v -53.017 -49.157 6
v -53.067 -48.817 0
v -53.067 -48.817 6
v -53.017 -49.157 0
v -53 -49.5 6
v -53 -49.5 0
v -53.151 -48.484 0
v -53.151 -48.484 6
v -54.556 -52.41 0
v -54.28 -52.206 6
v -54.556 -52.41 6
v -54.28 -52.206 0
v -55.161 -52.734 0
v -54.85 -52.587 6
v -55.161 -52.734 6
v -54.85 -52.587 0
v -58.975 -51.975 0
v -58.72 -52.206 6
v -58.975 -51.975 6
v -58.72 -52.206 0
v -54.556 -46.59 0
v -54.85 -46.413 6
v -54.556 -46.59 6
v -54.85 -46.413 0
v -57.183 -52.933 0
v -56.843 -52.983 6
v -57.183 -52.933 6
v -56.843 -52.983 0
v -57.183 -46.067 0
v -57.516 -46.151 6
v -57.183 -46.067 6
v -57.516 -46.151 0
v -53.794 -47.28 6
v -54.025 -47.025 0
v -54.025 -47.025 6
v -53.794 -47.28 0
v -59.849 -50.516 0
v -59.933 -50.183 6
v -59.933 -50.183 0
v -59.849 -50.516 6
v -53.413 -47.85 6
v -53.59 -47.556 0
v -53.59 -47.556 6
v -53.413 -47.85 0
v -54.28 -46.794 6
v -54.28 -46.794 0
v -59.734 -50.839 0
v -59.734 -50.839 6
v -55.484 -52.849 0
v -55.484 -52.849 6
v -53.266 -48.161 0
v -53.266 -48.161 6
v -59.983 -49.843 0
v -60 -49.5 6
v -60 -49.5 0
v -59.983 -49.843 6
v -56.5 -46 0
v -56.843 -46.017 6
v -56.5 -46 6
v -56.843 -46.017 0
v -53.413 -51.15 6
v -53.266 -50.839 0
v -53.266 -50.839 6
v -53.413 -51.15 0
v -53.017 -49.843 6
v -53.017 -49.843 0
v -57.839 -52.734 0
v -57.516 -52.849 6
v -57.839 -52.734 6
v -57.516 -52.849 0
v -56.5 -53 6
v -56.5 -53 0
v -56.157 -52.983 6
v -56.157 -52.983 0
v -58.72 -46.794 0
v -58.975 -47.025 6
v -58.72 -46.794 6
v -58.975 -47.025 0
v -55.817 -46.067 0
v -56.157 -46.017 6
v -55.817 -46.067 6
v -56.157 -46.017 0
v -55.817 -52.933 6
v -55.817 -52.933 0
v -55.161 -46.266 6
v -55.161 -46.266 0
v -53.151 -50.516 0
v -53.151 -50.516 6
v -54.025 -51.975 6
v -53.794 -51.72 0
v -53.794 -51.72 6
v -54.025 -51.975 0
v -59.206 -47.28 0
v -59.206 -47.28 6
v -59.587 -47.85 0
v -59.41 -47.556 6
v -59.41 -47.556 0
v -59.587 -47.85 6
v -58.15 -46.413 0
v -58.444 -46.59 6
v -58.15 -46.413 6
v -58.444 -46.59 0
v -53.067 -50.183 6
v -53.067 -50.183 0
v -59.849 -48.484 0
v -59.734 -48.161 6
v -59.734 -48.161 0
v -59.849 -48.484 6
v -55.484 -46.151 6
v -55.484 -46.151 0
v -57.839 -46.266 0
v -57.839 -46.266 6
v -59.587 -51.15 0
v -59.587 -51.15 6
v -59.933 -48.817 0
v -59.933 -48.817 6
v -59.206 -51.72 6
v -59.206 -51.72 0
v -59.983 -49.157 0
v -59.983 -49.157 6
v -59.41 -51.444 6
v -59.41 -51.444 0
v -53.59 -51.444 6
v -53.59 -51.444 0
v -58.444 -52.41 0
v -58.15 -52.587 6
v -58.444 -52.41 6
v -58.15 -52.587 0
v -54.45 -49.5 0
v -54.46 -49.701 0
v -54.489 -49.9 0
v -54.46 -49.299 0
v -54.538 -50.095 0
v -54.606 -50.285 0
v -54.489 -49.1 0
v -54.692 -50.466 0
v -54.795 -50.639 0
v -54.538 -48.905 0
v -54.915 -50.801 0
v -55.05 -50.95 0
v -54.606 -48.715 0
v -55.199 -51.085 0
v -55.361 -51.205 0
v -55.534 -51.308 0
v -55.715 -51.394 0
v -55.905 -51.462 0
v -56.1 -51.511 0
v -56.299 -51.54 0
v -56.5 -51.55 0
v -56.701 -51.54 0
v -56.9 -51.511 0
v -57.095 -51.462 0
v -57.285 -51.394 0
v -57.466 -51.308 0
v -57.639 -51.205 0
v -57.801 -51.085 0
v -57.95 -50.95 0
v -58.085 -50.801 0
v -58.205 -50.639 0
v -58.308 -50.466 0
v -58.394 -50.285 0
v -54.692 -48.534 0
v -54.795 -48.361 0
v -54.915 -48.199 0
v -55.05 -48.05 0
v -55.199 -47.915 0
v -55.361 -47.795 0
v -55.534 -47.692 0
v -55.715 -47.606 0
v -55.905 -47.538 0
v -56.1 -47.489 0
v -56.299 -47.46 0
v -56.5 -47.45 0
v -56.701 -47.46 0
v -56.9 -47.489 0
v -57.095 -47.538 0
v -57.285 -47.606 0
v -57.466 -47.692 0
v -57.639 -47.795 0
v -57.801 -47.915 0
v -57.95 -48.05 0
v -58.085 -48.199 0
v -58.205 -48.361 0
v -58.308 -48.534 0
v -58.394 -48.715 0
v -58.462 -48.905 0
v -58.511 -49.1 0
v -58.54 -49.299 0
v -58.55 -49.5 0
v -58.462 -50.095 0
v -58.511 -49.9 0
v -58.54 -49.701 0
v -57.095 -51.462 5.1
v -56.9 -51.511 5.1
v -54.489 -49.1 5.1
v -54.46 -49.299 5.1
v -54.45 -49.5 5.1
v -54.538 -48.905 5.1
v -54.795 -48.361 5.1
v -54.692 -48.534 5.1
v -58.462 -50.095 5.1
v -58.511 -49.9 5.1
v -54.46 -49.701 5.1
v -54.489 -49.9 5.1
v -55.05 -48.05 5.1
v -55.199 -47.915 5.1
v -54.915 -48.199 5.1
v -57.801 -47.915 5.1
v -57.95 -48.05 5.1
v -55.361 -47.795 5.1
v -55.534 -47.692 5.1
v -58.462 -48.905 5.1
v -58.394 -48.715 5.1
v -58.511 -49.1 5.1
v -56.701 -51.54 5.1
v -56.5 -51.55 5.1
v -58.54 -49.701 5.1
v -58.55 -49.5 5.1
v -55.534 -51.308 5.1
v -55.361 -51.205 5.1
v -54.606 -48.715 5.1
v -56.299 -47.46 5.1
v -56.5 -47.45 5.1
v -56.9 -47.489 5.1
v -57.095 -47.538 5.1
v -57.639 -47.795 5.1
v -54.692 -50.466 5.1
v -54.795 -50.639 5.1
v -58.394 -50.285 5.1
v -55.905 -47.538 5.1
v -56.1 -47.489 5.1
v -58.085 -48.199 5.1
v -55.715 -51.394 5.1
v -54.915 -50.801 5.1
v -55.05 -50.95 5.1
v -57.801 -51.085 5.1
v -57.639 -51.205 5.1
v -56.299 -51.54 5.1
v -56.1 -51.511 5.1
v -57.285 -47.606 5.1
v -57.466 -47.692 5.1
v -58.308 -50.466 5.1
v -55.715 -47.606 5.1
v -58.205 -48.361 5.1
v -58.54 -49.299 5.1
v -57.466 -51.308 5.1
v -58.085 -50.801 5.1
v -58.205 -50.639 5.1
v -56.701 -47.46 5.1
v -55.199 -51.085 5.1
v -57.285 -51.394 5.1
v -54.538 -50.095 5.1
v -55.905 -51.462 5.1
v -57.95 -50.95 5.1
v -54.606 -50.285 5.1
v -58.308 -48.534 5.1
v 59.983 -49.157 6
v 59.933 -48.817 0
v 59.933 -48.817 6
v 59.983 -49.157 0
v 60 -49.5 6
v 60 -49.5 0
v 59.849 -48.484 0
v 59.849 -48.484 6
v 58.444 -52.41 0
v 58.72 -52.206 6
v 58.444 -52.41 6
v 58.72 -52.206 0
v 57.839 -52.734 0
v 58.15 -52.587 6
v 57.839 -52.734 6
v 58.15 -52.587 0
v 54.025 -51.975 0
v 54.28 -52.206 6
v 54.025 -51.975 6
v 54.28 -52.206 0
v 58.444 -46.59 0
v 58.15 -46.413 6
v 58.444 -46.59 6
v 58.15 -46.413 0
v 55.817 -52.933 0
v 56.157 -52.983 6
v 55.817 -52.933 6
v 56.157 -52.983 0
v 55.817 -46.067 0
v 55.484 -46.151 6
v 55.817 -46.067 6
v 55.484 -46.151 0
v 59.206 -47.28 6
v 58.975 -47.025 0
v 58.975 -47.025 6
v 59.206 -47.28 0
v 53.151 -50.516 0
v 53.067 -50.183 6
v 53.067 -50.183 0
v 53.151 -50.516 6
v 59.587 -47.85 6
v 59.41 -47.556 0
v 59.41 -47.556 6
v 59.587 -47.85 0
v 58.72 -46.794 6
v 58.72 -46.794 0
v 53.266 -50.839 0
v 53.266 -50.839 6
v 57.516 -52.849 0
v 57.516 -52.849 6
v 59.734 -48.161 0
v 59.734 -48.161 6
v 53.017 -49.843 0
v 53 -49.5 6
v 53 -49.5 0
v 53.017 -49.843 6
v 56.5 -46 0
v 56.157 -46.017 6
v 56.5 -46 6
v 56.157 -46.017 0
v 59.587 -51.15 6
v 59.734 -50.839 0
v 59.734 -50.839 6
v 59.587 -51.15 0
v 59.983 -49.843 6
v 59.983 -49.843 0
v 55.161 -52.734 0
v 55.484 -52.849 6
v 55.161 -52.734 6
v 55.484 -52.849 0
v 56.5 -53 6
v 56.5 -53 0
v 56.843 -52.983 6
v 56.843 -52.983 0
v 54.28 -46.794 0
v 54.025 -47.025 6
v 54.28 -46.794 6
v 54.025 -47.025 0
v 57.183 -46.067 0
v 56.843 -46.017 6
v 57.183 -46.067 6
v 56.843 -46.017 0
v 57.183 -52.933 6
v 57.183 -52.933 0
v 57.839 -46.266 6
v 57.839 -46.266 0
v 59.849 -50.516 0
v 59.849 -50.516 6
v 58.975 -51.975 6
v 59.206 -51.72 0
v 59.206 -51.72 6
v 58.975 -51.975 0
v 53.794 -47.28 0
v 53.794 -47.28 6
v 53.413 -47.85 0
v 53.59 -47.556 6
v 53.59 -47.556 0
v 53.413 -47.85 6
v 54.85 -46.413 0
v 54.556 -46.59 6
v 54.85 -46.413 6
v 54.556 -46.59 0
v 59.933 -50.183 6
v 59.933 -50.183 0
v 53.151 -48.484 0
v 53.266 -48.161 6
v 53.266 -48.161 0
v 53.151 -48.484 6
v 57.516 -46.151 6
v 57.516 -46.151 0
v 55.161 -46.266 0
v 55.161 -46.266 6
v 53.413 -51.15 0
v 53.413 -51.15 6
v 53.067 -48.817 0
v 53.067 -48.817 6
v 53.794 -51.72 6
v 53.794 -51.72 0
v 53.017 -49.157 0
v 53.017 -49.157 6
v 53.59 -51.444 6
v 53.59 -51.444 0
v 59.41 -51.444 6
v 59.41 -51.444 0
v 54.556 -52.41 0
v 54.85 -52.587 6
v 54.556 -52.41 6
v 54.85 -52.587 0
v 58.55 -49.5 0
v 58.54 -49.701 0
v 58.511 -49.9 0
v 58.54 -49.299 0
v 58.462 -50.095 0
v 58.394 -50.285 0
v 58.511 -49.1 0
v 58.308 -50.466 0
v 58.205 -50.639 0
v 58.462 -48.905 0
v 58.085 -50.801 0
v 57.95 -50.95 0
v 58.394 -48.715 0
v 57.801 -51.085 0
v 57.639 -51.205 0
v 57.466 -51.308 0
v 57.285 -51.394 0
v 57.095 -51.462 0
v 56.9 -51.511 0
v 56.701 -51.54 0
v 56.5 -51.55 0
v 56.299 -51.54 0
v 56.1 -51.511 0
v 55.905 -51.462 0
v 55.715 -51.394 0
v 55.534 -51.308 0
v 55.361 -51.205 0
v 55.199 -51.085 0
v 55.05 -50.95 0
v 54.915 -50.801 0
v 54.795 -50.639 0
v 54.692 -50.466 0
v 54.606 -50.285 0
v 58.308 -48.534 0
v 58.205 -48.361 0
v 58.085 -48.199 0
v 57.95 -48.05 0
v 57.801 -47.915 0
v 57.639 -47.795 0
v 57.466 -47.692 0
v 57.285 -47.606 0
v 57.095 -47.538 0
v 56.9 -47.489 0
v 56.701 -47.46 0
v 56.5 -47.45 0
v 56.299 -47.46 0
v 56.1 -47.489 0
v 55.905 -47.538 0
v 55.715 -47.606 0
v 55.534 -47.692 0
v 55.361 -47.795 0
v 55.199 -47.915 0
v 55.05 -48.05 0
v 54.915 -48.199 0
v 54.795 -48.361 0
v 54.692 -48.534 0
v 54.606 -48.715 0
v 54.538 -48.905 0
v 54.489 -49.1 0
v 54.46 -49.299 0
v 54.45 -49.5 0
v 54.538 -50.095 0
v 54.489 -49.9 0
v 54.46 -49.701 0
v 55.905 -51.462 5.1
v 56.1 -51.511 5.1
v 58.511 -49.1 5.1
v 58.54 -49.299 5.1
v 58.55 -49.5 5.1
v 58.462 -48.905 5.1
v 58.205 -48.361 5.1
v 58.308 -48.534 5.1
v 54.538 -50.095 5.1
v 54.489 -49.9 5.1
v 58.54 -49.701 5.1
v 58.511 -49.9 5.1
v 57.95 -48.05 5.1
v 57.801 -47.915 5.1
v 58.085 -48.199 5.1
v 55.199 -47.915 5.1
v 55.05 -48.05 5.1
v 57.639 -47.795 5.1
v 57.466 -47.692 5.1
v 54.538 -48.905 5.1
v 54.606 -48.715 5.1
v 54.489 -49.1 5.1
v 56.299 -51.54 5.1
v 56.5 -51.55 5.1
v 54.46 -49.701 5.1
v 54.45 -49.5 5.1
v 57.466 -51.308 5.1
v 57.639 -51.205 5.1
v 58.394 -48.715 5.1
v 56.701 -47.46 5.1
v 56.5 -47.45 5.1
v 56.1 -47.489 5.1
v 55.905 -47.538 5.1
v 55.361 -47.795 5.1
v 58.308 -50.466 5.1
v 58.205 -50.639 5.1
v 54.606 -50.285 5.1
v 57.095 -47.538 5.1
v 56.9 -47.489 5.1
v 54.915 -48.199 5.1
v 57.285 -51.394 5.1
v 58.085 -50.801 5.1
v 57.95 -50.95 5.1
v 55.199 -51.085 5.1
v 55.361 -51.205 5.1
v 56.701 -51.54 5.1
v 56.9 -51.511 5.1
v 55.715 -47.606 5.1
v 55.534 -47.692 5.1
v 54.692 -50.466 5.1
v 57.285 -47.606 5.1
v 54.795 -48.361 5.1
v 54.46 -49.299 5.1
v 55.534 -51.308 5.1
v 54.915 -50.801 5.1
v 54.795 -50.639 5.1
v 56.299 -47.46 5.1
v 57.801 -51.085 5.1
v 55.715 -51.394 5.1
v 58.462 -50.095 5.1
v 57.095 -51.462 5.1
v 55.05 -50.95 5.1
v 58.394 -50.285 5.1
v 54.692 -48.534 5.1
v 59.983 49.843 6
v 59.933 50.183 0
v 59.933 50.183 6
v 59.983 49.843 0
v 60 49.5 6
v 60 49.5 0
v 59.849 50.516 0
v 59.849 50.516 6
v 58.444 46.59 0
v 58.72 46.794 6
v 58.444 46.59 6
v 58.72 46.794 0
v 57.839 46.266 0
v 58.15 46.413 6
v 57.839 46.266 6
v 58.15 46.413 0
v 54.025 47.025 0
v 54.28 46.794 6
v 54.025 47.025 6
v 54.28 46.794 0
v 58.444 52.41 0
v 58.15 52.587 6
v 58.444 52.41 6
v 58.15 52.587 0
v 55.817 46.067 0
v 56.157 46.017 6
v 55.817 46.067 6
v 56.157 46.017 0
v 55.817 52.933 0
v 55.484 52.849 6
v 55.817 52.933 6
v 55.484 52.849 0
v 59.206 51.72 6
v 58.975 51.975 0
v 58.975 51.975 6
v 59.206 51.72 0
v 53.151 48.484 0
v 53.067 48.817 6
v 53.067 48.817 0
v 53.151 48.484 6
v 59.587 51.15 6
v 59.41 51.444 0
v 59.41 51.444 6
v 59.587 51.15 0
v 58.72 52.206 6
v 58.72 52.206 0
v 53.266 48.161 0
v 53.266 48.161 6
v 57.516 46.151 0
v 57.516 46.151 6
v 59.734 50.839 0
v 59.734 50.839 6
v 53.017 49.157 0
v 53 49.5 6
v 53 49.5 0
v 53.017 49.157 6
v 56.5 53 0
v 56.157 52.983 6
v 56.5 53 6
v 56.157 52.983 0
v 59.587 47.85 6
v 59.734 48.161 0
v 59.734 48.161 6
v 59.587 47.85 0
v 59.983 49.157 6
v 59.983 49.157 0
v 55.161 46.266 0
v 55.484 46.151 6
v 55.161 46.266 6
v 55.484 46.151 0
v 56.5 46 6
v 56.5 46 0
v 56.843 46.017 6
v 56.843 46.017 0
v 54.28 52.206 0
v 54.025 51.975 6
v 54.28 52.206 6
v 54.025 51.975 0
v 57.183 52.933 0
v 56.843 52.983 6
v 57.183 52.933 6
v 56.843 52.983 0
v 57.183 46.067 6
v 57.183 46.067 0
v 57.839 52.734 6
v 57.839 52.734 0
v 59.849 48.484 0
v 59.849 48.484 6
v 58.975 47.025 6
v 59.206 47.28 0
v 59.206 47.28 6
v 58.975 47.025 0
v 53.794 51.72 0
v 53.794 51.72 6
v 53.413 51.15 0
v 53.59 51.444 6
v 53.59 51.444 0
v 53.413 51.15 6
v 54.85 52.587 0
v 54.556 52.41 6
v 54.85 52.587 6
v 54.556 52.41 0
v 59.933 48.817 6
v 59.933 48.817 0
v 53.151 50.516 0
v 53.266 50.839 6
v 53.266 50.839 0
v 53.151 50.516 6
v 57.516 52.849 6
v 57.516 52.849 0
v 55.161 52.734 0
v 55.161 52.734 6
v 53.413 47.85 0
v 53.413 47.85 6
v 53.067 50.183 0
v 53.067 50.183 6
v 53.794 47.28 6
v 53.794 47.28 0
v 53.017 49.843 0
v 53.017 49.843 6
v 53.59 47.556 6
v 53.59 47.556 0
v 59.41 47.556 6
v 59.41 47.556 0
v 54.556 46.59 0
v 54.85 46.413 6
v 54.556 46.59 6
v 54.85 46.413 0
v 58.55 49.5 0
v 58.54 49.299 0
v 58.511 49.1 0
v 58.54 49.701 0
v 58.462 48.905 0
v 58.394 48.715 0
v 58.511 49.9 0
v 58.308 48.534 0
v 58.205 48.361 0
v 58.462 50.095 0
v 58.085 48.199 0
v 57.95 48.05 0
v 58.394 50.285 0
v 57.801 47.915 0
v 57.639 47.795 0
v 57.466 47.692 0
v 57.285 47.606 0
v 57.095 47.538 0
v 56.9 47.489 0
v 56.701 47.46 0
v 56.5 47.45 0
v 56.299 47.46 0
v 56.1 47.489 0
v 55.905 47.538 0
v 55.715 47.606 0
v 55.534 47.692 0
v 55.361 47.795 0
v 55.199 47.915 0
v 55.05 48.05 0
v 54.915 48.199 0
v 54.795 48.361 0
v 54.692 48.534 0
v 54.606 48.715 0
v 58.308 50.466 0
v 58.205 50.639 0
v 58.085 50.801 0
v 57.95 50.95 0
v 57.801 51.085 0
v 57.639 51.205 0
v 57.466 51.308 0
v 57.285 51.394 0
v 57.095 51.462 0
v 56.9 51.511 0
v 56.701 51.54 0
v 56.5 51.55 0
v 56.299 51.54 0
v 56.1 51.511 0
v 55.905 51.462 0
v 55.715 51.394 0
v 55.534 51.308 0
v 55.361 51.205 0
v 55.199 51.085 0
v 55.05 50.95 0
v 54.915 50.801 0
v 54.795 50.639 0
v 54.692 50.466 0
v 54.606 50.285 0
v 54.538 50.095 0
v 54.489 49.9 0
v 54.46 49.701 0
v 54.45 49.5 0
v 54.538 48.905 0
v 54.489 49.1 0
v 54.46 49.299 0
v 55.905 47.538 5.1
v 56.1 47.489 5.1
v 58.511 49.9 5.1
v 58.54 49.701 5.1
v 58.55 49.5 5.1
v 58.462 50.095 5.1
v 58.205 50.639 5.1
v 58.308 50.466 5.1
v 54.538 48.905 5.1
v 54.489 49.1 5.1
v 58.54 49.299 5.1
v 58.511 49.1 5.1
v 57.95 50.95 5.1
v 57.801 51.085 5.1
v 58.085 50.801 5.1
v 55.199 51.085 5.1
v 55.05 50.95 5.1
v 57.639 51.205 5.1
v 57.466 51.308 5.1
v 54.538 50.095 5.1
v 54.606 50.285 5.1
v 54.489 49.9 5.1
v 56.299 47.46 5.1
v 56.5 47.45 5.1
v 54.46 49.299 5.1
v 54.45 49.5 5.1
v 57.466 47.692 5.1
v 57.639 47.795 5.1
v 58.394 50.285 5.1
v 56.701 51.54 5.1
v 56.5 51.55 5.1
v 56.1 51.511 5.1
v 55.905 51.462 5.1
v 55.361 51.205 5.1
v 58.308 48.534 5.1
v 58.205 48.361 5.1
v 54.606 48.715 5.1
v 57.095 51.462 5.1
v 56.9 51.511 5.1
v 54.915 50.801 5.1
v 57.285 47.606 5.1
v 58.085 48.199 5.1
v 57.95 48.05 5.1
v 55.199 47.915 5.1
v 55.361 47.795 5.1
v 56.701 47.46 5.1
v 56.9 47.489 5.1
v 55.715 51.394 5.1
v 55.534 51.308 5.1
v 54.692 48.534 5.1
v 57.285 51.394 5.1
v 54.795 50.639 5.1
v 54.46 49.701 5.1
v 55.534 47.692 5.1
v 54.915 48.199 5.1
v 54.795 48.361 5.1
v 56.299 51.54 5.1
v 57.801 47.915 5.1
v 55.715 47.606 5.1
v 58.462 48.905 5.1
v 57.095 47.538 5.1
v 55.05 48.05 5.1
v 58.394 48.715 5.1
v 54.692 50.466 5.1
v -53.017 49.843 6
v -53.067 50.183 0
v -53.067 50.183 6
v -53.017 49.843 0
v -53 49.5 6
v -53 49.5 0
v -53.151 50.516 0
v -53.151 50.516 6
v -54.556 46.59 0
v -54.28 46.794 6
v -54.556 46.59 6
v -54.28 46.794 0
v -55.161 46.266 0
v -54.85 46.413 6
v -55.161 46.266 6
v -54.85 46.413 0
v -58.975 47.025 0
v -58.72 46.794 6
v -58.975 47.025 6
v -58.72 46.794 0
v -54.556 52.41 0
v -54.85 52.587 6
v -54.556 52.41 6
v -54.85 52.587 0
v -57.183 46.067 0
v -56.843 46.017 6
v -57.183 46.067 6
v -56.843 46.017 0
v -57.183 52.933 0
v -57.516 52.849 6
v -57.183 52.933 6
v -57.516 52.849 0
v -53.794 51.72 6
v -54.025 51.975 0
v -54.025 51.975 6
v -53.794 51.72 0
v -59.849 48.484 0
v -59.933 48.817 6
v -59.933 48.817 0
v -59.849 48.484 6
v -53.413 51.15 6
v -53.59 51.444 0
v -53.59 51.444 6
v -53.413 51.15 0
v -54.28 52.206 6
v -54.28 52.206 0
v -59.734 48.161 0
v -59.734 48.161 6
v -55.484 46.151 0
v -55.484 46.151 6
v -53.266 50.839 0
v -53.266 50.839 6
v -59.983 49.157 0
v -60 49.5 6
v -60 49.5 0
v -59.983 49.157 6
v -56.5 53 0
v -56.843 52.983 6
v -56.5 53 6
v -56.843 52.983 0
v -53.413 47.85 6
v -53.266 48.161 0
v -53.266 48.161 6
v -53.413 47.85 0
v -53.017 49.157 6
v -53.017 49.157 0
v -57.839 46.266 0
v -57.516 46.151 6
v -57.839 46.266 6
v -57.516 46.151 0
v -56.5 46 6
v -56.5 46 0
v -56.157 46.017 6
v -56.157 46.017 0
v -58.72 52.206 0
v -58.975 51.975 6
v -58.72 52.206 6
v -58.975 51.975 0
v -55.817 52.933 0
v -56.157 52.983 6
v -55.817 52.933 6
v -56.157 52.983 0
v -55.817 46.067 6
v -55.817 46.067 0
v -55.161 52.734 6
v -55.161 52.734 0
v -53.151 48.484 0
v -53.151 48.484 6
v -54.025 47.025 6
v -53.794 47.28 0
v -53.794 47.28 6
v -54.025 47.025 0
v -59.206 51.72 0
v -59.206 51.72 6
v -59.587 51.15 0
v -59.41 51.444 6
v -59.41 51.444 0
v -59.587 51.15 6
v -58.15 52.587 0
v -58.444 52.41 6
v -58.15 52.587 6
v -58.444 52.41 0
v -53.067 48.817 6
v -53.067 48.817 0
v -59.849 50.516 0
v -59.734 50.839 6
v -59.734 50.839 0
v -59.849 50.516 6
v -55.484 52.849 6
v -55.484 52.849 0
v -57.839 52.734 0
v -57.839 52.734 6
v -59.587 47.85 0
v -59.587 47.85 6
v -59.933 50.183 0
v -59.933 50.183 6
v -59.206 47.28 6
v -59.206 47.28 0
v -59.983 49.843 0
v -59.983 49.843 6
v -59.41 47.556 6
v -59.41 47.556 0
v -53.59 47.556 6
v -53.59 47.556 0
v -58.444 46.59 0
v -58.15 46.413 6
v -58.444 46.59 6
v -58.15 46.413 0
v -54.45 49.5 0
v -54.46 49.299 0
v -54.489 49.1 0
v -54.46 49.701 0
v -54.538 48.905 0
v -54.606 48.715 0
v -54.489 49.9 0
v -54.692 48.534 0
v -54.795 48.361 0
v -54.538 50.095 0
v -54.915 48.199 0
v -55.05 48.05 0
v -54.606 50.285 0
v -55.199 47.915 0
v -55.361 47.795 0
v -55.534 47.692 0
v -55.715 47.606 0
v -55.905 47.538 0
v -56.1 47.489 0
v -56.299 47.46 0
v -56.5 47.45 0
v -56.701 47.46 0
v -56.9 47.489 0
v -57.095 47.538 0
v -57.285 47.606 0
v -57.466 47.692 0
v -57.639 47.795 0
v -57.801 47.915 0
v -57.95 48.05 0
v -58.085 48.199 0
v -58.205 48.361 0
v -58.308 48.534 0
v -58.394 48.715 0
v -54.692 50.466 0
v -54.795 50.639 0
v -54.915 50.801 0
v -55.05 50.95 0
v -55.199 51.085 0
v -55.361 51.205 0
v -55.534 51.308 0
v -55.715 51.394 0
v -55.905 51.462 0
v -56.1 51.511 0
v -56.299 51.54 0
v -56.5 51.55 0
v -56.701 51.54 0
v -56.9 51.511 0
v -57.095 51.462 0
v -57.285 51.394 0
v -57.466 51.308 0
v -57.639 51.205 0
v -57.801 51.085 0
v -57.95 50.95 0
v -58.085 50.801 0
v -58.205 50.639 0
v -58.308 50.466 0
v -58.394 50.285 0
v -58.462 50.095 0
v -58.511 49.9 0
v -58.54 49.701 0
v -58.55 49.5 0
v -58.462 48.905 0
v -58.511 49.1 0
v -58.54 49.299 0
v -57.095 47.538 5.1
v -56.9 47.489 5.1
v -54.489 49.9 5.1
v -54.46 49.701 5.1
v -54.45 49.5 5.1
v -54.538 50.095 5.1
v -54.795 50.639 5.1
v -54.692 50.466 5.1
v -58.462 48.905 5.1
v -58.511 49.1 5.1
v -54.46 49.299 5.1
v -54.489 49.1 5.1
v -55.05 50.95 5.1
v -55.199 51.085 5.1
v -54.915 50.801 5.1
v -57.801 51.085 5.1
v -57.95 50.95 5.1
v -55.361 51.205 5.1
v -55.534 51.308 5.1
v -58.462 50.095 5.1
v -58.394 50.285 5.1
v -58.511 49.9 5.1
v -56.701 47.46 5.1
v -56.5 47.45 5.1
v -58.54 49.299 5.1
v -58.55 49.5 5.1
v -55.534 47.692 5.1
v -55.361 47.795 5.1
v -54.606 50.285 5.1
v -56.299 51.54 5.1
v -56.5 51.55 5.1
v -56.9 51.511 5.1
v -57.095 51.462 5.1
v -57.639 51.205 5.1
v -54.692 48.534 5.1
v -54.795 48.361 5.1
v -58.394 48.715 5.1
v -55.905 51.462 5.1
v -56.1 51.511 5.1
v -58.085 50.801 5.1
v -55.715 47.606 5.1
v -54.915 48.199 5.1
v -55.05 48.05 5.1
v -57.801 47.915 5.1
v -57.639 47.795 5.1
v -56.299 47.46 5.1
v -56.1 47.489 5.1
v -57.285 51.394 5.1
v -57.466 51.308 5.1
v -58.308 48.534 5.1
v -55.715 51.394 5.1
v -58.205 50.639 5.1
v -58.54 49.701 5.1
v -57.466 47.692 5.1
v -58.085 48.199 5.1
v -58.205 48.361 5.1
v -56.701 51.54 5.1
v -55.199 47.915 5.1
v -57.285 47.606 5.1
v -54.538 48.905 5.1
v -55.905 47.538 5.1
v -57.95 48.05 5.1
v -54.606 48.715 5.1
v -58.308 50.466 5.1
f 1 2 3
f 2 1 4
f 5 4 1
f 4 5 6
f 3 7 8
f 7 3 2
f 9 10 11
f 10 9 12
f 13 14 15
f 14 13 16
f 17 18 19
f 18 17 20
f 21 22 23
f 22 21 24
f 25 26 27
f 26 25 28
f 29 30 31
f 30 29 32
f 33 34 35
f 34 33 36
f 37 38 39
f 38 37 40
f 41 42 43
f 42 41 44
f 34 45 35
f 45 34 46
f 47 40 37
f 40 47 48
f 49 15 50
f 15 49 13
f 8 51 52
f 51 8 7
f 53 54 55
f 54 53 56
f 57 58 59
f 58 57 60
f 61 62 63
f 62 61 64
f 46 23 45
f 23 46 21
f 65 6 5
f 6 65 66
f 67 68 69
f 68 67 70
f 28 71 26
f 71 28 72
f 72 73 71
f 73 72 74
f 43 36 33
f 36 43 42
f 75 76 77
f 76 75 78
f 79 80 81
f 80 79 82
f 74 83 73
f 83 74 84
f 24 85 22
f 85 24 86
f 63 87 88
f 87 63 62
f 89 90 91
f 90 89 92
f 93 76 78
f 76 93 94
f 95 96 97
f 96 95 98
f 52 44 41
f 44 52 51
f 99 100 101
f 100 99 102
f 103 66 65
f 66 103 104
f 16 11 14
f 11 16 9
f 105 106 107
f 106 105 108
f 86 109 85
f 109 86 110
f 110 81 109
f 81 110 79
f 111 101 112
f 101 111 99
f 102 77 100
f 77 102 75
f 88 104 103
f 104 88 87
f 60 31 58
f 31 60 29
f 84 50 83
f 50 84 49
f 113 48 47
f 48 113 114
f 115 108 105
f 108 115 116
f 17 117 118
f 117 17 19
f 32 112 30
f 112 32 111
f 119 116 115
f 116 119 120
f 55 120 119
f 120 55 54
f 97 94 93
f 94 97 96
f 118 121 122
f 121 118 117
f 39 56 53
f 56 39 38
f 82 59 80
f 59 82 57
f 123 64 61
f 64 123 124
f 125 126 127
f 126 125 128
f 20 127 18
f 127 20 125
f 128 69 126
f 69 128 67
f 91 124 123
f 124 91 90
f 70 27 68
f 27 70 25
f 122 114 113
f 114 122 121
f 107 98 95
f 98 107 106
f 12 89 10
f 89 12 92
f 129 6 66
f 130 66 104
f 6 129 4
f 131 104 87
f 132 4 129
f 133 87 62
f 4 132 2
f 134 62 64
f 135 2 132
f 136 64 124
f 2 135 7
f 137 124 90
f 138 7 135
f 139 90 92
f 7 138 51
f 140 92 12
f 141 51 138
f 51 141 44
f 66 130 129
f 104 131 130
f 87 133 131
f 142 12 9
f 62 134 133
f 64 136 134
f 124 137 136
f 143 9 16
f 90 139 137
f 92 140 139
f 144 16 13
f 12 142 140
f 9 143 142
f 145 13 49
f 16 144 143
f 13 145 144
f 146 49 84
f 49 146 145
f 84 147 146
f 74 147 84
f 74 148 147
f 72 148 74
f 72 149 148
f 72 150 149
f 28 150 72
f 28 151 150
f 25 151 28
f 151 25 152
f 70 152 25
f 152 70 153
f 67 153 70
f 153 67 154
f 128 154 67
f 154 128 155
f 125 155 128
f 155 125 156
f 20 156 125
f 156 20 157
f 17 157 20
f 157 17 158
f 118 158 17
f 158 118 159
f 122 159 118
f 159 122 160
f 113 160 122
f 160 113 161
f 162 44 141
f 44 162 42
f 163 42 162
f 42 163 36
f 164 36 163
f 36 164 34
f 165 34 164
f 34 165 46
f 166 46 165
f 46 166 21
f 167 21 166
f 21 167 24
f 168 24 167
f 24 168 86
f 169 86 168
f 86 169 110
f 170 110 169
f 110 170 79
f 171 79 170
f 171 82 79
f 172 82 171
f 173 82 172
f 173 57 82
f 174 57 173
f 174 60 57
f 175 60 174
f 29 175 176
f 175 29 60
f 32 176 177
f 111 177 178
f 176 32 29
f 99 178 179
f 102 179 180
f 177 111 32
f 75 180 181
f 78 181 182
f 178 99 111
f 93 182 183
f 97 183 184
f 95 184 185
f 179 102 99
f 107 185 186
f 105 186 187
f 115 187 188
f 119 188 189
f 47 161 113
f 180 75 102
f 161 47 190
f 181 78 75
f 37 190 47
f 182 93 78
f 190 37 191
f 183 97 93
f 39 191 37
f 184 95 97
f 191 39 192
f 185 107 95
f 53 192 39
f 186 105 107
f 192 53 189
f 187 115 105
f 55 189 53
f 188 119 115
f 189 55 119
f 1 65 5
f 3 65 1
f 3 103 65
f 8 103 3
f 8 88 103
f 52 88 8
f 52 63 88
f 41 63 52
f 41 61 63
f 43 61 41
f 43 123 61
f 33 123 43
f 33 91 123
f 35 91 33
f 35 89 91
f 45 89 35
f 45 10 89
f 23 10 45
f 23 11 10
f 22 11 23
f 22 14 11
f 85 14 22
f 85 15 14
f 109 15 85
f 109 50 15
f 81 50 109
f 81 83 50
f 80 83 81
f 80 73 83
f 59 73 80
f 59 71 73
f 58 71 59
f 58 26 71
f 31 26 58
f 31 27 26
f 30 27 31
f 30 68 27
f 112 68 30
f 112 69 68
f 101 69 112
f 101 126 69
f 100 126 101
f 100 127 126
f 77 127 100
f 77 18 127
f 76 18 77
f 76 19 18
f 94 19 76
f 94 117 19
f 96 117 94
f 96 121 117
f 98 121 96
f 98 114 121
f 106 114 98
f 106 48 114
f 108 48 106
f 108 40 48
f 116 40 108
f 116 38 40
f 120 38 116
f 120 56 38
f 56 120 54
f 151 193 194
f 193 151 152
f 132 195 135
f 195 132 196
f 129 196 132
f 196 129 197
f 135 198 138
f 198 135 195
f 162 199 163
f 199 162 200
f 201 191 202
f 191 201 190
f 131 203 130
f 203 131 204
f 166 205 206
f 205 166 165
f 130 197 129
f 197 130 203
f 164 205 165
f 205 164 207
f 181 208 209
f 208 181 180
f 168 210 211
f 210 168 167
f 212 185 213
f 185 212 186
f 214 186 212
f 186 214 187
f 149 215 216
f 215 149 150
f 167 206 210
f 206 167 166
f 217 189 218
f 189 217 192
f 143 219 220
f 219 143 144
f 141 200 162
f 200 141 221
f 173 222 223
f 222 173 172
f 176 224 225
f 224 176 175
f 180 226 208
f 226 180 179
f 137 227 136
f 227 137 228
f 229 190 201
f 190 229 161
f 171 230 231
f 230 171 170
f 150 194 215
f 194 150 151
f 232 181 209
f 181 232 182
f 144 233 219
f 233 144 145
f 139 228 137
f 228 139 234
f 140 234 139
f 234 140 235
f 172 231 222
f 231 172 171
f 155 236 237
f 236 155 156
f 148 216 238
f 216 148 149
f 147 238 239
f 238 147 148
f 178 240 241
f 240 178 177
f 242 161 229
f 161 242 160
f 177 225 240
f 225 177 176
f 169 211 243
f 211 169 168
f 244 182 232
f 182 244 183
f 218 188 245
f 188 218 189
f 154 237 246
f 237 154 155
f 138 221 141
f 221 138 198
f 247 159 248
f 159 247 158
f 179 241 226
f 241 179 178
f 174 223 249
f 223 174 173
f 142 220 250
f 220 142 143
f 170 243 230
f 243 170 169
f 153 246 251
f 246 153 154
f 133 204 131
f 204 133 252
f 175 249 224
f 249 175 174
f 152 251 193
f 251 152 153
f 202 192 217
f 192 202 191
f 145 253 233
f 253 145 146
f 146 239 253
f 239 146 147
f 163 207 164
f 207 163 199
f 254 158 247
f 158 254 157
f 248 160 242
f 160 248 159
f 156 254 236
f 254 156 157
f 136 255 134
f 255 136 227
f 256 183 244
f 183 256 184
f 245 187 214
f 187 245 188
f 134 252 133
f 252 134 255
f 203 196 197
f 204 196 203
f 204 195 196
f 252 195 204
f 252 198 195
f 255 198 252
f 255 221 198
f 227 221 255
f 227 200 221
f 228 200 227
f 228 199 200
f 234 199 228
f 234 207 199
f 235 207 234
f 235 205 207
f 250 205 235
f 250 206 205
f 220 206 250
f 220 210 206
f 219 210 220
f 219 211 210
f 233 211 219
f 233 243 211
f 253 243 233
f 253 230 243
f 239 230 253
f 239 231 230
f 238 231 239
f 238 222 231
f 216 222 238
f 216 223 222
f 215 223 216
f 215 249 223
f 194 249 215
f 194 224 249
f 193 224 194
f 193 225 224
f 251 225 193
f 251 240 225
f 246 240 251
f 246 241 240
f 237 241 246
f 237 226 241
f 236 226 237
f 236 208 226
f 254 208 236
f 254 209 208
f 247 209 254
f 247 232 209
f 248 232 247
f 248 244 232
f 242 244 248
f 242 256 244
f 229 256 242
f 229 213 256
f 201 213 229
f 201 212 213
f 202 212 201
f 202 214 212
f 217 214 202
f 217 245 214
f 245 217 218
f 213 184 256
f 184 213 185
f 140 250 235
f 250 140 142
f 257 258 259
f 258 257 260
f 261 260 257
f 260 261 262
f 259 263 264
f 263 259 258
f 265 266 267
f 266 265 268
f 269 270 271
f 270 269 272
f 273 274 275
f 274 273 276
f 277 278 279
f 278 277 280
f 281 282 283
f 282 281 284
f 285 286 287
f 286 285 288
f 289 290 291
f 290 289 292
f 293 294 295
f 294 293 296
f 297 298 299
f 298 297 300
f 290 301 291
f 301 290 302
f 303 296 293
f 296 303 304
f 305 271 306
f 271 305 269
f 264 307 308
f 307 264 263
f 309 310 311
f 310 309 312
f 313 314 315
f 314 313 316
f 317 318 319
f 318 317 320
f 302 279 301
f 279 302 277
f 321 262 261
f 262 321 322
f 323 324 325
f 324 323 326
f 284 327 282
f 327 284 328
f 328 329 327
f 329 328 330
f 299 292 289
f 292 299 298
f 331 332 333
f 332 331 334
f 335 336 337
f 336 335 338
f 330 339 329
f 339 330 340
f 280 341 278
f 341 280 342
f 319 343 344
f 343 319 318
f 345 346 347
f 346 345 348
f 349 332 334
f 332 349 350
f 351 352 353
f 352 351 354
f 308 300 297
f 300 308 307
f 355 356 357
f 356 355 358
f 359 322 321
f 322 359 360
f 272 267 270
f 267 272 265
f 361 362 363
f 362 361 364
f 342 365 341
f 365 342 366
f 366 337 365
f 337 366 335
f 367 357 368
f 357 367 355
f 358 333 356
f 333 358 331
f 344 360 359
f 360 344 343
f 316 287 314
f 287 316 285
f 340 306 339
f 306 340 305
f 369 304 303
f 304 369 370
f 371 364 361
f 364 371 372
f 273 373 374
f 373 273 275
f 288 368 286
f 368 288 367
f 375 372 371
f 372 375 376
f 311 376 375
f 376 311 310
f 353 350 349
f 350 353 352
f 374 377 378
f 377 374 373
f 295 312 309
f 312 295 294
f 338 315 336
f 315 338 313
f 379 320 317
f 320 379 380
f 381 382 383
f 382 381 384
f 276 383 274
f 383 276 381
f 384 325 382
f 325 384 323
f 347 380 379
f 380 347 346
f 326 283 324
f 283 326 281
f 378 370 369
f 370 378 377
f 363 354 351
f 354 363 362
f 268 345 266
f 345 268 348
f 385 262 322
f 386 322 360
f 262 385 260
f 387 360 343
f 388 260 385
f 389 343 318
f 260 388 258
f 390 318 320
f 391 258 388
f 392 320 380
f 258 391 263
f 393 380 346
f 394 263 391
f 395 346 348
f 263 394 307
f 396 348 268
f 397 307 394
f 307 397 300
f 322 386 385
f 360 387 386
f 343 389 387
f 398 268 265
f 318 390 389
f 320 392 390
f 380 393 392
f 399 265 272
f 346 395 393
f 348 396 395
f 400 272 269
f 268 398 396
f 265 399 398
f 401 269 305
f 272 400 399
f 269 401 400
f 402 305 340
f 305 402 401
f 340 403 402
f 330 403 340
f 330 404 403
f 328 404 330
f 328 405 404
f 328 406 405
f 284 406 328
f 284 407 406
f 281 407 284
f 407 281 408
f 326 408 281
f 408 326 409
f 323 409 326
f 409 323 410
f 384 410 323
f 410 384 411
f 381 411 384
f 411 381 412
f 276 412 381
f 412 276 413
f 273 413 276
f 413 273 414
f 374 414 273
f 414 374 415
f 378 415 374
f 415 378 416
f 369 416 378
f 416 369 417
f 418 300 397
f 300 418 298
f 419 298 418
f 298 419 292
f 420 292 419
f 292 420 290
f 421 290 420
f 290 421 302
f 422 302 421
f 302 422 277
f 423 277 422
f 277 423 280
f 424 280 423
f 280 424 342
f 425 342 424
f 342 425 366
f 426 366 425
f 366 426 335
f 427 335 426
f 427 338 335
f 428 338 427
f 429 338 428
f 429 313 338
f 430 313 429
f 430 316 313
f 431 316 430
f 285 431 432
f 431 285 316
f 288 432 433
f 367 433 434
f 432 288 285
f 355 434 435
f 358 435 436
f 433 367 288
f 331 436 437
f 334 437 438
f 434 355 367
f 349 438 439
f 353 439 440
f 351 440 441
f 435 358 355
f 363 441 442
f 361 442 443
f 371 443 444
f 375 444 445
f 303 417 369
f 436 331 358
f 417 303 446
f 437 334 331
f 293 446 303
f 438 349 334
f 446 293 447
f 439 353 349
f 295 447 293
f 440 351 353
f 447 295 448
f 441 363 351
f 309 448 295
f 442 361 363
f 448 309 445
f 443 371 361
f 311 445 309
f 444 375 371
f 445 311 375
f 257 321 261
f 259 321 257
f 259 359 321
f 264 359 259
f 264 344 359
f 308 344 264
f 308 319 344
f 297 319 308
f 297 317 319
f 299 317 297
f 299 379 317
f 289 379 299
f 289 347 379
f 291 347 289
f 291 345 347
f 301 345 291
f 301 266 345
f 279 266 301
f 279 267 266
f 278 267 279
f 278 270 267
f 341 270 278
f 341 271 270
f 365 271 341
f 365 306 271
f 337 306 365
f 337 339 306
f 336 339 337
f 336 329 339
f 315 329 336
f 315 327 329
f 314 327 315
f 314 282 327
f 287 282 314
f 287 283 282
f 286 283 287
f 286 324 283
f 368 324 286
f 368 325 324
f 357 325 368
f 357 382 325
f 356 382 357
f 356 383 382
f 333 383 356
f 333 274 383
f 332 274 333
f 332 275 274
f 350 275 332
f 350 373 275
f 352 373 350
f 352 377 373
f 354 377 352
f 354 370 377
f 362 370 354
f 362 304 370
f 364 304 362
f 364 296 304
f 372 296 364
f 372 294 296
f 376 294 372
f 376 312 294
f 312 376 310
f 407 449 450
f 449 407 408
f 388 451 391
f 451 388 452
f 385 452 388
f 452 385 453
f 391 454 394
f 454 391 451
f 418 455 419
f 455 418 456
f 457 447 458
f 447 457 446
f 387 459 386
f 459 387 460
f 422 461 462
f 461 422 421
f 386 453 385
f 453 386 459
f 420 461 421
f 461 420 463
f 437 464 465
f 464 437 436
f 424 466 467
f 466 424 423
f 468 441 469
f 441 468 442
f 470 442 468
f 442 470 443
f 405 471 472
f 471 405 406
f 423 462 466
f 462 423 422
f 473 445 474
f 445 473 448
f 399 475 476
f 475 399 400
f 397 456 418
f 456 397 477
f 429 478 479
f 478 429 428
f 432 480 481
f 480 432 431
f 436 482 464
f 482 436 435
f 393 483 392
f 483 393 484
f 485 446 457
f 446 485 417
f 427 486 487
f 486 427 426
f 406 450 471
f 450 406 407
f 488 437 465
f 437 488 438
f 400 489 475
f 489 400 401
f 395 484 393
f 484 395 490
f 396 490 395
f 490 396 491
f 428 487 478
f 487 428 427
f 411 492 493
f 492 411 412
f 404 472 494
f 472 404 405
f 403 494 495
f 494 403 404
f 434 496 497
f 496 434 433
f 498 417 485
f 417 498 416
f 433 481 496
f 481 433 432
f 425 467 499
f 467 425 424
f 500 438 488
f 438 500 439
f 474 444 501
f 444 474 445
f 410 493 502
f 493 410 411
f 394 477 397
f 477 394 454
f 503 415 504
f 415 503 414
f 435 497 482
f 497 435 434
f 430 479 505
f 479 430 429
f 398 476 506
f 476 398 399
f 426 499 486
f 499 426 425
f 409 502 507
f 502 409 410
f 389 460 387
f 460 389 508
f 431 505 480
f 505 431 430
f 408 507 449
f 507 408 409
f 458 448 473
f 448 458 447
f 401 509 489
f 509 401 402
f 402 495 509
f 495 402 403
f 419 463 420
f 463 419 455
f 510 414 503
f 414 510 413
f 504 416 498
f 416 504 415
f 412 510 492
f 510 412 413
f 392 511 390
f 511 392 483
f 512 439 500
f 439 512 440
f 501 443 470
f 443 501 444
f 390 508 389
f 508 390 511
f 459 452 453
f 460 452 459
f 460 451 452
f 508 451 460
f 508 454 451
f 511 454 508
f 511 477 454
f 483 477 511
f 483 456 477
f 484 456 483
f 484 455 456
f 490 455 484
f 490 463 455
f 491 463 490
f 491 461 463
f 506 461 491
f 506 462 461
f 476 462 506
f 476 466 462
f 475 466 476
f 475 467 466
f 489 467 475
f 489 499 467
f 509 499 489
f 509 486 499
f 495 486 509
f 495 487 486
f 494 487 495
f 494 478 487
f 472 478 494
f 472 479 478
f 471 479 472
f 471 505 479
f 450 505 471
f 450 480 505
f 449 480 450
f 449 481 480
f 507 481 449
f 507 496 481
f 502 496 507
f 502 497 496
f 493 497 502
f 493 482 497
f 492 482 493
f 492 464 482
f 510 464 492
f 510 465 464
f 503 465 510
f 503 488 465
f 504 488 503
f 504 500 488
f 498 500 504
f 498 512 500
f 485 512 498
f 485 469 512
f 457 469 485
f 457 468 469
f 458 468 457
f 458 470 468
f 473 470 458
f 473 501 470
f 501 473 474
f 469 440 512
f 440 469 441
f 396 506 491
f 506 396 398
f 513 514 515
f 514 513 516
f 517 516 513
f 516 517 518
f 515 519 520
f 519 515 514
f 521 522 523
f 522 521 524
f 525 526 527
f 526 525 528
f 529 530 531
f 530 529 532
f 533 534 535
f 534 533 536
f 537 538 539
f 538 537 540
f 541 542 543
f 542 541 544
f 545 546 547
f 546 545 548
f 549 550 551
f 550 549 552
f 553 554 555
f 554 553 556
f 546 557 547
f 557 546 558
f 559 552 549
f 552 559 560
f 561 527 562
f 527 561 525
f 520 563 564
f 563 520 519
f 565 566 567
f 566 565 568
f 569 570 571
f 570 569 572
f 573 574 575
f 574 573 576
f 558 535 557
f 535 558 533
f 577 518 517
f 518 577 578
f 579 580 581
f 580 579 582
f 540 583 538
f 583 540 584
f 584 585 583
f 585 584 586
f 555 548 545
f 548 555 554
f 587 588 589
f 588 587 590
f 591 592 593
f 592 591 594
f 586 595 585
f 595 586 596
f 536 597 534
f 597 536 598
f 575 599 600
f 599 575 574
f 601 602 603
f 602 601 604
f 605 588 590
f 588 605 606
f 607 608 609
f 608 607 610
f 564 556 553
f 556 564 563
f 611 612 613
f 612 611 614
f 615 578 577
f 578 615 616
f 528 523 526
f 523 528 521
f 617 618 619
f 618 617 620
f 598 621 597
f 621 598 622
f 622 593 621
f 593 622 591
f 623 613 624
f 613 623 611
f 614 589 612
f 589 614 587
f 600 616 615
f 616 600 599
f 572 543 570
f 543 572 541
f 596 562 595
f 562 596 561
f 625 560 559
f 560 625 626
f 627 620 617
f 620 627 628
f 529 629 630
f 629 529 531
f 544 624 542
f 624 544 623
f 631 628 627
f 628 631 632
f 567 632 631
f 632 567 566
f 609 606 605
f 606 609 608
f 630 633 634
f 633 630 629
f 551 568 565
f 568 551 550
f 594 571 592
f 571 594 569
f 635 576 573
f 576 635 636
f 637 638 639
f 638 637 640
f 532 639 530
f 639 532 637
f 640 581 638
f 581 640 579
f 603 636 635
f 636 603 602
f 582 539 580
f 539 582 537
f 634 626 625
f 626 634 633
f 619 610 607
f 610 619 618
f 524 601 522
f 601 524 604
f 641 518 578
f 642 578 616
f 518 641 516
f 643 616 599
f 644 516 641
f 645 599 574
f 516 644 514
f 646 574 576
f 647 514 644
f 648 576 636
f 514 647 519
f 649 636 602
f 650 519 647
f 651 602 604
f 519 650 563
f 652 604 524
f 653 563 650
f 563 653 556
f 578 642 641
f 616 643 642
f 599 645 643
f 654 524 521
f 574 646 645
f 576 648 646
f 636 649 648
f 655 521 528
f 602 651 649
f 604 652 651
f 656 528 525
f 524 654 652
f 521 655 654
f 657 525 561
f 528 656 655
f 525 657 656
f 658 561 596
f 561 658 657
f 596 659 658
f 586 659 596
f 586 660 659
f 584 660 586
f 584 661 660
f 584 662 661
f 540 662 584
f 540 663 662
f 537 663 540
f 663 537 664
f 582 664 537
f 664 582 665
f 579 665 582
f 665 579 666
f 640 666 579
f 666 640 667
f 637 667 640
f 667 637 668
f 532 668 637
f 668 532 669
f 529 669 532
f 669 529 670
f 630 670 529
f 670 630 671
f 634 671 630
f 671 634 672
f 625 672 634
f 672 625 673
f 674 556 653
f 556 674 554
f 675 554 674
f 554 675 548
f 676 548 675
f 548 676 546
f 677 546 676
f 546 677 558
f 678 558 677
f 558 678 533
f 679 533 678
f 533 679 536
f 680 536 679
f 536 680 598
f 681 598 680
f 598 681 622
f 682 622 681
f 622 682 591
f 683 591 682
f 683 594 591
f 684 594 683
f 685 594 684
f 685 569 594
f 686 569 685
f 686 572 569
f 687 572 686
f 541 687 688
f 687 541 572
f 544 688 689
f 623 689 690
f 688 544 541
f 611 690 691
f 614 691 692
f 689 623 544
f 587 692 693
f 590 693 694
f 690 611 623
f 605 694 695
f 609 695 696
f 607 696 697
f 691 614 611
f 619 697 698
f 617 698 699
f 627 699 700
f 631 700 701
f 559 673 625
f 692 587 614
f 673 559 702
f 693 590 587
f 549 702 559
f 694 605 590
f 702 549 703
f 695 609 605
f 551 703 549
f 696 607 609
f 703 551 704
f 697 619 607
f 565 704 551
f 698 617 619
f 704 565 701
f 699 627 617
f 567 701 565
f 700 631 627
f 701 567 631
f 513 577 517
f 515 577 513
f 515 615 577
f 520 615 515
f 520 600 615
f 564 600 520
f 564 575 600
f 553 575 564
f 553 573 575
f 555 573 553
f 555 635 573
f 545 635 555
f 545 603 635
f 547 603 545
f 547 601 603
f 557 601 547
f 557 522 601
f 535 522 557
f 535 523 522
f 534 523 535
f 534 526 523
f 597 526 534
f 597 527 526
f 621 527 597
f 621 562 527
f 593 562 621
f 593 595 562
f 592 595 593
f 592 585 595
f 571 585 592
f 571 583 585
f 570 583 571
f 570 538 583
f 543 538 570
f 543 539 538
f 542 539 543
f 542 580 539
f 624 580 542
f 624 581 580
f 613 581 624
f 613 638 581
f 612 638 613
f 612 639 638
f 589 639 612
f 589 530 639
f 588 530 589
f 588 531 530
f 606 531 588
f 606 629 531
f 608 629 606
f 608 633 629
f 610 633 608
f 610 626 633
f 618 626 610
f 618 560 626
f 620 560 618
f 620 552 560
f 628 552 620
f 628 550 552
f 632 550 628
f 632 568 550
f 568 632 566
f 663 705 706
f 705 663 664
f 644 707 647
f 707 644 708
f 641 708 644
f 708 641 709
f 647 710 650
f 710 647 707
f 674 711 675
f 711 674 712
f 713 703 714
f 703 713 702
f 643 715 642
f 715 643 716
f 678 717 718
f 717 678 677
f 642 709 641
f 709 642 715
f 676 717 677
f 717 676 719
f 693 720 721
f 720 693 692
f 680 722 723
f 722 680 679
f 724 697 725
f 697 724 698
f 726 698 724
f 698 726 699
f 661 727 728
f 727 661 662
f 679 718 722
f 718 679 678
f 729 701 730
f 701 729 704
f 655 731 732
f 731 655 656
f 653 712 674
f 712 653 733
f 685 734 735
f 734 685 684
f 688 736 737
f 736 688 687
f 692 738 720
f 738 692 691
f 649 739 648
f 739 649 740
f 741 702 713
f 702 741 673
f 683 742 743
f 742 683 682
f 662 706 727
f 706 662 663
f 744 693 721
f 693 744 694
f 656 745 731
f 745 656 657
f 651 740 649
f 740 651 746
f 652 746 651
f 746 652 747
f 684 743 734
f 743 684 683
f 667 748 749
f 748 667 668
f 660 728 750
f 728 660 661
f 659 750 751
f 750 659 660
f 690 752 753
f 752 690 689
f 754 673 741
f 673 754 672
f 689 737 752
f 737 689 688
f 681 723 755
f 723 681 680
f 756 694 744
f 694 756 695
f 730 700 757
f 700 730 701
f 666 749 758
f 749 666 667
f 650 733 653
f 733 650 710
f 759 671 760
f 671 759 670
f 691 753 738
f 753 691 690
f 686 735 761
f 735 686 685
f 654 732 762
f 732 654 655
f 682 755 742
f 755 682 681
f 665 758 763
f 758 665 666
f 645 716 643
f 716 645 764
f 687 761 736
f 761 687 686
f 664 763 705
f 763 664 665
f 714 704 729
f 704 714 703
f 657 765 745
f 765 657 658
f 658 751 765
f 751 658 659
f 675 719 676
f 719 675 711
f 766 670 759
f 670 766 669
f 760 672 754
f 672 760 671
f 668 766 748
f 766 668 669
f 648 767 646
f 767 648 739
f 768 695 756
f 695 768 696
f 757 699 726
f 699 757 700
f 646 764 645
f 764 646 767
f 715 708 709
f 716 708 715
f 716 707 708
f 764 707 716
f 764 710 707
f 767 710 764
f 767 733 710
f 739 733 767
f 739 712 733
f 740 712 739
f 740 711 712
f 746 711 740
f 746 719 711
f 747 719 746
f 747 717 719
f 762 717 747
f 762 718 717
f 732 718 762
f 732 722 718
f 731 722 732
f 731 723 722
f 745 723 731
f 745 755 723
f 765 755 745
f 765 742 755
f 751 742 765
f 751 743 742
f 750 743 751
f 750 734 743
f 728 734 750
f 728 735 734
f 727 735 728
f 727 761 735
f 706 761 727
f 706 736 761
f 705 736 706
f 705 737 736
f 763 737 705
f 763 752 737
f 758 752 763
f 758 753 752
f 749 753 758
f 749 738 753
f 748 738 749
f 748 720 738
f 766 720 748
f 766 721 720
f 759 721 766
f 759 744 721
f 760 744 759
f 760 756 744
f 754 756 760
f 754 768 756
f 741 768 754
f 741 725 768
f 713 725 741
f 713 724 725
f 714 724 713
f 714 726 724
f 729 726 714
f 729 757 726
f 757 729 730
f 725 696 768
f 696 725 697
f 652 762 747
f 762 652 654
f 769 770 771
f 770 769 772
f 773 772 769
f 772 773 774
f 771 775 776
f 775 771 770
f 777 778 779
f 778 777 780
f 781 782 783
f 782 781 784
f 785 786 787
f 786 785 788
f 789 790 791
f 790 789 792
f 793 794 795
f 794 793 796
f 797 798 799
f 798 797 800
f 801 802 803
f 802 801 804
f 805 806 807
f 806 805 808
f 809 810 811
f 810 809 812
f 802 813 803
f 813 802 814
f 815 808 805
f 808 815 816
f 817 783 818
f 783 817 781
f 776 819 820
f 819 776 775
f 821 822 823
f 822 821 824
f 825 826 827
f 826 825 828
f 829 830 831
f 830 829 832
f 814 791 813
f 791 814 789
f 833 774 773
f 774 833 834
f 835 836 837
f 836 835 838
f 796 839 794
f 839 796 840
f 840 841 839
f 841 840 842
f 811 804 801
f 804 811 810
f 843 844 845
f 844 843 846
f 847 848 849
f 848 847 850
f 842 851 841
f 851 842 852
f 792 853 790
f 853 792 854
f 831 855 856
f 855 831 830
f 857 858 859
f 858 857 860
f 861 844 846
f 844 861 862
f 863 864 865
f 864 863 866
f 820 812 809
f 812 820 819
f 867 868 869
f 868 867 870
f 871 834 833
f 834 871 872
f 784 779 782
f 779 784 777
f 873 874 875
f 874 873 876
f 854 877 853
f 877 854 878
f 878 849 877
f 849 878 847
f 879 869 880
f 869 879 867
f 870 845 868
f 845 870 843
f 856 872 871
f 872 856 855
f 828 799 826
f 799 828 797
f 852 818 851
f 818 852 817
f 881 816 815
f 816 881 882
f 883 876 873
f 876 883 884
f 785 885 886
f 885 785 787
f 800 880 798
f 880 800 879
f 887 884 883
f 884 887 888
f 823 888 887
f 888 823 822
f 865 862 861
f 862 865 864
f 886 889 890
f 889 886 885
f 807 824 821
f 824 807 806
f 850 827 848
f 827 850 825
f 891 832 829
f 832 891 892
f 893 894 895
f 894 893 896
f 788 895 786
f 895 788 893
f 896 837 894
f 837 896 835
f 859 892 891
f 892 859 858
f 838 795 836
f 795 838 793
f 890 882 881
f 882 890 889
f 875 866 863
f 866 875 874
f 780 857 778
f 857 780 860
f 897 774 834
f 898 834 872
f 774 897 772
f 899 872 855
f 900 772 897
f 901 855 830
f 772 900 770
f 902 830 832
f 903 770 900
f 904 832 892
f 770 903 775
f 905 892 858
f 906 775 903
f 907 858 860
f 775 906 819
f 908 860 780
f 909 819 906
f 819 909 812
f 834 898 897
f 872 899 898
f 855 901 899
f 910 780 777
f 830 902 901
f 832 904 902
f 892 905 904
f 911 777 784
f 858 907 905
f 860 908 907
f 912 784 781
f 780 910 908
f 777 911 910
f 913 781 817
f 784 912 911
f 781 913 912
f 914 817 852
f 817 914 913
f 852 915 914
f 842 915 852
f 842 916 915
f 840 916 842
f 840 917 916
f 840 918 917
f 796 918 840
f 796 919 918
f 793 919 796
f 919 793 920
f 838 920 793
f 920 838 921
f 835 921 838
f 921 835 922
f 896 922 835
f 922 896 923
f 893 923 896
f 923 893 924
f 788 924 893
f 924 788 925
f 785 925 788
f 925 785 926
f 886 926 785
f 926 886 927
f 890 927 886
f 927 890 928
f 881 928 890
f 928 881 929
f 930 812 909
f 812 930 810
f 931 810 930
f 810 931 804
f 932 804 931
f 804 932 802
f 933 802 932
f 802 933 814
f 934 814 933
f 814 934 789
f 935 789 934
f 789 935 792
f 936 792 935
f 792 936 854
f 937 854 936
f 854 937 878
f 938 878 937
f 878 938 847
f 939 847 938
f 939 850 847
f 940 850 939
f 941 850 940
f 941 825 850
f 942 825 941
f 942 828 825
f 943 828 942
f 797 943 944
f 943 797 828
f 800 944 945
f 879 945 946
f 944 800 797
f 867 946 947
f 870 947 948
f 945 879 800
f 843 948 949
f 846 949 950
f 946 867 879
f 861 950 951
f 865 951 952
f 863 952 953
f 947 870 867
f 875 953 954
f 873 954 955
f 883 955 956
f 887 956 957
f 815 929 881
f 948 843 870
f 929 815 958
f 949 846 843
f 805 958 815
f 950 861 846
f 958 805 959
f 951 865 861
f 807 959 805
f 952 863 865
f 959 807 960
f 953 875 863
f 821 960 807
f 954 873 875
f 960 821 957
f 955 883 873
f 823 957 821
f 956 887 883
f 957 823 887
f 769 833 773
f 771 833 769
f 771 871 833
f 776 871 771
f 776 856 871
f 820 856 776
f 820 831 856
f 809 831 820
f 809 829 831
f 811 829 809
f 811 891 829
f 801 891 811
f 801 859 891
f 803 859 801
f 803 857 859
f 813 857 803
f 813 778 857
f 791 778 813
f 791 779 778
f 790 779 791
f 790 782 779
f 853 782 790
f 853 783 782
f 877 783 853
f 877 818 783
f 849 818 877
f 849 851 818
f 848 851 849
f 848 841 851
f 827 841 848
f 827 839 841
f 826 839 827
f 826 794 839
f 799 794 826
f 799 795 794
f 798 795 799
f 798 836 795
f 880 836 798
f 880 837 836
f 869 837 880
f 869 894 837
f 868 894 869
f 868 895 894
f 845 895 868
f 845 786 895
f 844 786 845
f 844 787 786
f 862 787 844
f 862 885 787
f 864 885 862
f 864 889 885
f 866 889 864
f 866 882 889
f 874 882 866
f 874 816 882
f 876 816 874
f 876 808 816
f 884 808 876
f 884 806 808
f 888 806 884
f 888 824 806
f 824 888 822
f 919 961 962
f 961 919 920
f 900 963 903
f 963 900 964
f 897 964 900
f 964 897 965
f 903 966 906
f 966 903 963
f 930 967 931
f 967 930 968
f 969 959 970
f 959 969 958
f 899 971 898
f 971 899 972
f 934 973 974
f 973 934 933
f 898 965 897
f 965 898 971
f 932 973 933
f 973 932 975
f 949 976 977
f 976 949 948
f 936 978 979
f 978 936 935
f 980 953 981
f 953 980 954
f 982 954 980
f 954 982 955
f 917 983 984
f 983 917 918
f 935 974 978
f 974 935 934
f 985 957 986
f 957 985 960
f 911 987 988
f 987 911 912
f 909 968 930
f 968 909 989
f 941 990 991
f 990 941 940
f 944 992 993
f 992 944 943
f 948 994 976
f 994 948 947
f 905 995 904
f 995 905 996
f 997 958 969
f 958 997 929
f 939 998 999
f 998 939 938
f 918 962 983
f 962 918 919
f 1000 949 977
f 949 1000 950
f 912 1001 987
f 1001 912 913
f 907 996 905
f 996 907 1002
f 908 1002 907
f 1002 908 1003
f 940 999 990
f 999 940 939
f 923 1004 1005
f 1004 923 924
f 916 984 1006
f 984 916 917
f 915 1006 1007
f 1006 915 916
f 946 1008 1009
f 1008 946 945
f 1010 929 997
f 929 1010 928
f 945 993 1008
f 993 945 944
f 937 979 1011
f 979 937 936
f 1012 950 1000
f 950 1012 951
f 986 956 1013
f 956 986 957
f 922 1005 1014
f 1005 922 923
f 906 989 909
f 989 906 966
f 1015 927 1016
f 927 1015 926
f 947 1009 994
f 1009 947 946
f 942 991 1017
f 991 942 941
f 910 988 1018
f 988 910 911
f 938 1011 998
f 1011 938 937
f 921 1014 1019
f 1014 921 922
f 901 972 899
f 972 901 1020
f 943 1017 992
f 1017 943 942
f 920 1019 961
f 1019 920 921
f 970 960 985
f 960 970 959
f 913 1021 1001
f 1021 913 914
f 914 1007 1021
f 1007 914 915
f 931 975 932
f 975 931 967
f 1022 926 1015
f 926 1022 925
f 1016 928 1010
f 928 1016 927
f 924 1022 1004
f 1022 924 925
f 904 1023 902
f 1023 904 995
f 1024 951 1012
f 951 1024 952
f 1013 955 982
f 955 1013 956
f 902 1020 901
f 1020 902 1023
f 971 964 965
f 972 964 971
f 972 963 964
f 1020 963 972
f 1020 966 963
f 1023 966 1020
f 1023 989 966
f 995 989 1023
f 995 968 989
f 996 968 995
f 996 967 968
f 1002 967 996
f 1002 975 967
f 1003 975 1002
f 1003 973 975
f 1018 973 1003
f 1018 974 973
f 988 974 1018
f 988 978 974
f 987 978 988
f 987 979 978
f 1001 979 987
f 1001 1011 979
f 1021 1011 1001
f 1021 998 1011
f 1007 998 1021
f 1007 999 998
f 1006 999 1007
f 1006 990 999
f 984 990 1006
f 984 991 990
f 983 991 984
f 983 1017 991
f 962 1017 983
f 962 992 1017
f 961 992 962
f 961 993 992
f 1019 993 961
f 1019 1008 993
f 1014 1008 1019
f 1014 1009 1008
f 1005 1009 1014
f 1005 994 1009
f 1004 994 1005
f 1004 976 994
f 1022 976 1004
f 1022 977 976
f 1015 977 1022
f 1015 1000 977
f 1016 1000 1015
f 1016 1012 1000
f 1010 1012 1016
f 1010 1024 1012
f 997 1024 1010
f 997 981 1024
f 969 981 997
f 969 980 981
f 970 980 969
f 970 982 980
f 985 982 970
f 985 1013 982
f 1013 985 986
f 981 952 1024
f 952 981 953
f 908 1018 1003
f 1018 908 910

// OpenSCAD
// file: ../../../00_parametros.scad
//
// ============================================================================
// SteamMachine UM790
// Project Phoenix
//
// Archivo : 00_parametros.scad
// Versión : 2.0
//
// ÚNICA fuente de parámetros del proyecto.
//
// NO añadir parámetros duplicados en otros archivos.
//
// ============================================================================

$fn = 64;

//=============================================================================
// INFORMACIÓN
//=============================================================================

project_name    = "SteamMachine UM790";
project_version = "2.0";

//=============================================================================
// CARCASA
//=============================================================================

case_width  = 156;
case_depth  = 162.4;
case_height = 152;

wall_thickness   = 3;
top_thickness    = 3;
bottom_thickness = 3;

//=============================================================================
// BANDEJA
//=============================================================================

tray_width      = 150;
tray_depth      = 150;
tray_thickness  = 3;

base_frame_width = 10;

base_outer_chamfer = 4;
base_inner_chamfer = 4;

//=============================================================================
// PCB UM790
//=============================================================================

pcb_width      = 122.0;
pcb_depth      = 119.5;
pcb_thickness  = 1.60;

// separación entre centros de tornillos
um790_mount_spacing_x = 113.0;
um790_mount_spacing_y = 99.0;

//=============================================================================
// POSTES
//=============================================================================

um790_post_height   = 6.0;
um790_post_diameter = 7.0;

insert_diameter = 4.10;
insert_depth    = 5.00;

//=============================================================================
// DERIVADOS
//=============================================================================

off_x = um790_mount_spacing_x/2;
off_y = um790_mount_spacing_y/2;

//=============================================================================
// NERVIOS
//=============================================================================

rib_width  = 3.0;
rib_height = 5.0;

//=============================================================================
// VENTILACIÓN
//=============================================================================

vent_slot_width  = 4.0;
vent_slot_length = 40.0;
vent_spacing     = 8.0;

//=============================================================================
// IMANES
//=============================================================================

magnet_diameter = 8.0;
magnet_height   = 3.0;

//=============================================================================
// TORNILLERÍA
//=============================================================================

mount_hole = 3.4;

//=============================================================================
// COMPATIBILIDAD CON ARCHIVOS ANTIGUOS
//=============================================================================

// PCB
pcb_x = pcb_width;
pcb_y = pcb_depth;

// Separación de agujeros
hole_dist_x = um790_mount_spacing_x;
hole_dist_y = um790_mount_spacing_y;

// Postes
standoff_height = um790_post_height;
standoff_dia    = um790_post_diameter;

// Insertos
insert_dia = insert_diameter;

// Base
base_thickness = tray_thickness;
// main file
//
// ============================================================================
// SteamMachine UM790
// Project Phoenix
//
// Archivo : posts.scad
// Versión : 2.1
//
// Postes de fijación de la placa UM790 PRO
//
// ============================================================================

include <../../../00_parametros.scad>;

$fn = 64;


//=============================================================================
// POSTE INDIVIDUAL
//=============================================================================

module post()
{
    difference()
    {
        cylinder(
            h = standoff_height,
            d = standoff_dia
        );

        translate([0,0,-0.1])

        cylinder(
            h = insert_depth + 0.2,
            d = insert_dia
        );
    }
}


//=============================================================================
// CONJUNTO DE POSTES
//=============================================================================

module posts()
{

    translate([-off_x,-off_y,0])
        post();

    translate([ off_x,-off_y,0])
        post();

    translate([ off_x, off_y,0])
        post();

    translate([-off_x, off_y,0])
        post();

}


//=============================================================================
// PREVIEW
//=============================================================================

posts();
